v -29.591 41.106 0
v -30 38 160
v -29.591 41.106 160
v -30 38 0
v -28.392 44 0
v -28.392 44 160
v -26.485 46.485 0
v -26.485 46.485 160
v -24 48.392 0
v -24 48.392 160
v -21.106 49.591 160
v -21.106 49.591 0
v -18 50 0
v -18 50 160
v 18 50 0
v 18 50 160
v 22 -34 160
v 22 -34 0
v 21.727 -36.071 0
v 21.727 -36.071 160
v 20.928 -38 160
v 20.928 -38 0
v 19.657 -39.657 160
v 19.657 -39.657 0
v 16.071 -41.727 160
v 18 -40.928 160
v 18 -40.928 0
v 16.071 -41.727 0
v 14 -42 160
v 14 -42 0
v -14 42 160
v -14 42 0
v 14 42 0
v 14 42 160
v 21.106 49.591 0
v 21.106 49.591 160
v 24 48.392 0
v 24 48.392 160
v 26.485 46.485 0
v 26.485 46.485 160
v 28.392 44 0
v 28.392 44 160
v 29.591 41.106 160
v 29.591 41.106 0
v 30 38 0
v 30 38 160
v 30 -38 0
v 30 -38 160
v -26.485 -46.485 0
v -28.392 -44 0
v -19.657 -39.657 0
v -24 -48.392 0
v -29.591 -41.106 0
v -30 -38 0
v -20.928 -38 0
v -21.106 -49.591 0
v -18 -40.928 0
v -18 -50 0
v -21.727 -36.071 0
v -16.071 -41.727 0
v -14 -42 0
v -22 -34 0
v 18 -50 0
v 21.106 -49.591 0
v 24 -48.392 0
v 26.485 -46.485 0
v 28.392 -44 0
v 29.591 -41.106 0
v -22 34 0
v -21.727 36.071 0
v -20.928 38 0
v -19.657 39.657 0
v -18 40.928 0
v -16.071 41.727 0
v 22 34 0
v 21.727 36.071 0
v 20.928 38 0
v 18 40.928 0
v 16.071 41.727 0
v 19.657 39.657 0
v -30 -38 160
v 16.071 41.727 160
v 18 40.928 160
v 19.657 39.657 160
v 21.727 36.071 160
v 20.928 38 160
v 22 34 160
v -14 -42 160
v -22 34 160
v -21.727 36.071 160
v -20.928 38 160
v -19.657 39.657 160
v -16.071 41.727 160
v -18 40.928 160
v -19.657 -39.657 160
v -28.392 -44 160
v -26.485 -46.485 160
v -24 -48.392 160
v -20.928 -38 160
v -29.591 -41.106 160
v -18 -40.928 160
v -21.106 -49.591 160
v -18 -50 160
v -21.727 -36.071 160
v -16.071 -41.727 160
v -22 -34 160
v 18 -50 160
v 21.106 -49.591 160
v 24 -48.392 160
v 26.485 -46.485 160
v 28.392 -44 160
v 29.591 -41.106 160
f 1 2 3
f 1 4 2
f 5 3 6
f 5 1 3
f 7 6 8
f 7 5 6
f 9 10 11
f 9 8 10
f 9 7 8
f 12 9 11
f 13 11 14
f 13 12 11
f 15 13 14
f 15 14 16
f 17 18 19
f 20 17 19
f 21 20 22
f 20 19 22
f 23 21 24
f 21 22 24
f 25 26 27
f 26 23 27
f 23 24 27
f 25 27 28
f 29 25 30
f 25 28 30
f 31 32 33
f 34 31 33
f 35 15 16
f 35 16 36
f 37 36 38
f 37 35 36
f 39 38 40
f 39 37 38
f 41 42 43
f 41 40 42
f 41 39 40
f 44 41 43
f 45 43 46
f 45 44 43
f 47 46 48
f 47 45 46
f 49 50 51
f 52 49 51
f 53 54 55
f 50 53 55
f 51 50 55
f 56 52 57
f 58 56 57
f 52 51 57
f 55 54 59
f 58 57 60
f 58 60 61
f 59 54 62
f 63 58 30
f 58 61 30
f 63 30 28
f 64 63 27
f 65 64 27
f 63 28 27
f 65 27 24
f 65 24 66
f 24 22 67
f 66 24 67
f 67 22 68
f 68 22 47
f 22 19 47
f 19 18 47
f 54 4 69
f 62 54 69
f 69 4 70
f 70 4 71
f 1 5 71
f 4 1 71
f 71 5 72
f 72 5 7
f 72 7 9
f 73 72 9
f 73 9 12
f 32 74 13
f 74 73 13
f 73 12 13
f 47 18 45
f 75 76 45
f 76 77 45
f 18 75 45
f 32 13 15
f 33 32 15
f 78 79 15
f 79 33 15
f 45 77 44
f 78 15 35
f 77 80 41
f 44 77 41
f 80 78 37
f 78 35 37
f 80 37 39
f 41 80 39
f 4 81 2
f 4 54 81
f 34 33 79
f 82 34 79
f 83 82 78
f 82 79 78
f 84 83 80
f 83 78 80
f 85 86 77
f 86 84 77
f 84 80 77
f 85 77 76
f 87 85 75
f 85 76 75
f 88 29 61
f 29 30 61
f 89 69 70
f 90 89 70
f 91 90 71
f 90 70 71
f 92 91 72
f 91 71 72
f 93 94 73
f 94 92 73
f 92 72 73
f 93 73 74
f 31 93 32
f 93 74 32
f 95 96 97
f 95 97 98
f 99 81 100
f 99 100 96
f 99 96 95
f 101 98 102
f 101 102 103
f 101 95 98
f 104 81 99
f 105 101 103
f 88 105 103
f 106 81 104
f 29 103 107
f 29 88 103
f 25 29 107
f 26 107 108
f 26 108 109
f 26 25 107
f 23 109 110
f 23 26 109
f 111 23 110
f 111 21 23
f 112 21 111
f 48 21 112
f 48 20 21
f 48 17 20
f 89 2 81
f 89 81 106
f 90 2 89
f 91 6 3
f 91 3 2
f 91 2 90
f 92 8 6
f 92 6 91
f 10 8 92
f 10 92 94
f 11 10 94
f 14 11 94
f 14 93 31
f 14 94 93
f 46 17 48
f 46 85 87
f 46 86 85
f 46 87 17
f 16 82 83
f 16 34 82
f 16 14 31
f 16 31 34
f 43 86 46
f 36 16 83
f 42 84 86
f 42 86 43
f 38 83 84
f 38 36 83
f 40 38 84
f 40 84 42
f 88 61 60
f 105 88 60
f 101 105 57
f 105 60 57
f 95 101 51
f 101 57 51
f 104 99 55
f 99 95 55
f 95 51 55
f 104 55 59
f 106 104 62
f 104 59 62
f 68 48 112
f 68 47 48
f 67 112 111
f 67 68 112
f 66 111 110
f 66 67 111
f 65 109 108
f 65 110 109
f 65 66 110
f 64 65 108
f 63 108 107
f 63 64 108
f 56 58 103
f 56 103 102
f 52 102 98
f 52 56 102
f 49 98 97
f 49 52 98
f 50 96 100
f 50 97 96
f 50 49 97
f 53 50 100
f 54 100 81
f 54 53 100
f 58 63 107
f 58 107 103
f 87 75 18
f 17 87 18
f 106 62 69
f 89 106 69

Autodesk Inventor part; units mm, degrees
ref_plane "YZ Plane" through (0, 0, 0) normal (1, 0, 0) x (0, 1, 0)
ref_plane "Startebene" through (0, 0, 0) normal (0, 0, 1) x (1, 0, 0)
ref_plane "Endebene" through (0, 0, 160) normal (0, 0, 1) x (1, 0, 0)
sketch "Skizze" plane through (0, 0, 0) normal (0, 0, 1) x (1, 0, 0)
  line L0 (-30, -38) -> (-30, 38)
  line L1 (-18, 50) -> (18, 50)
  line L2 (30, 38) -> (30, -38)
  line L3 (18, -50) -> (-18, -50)
  arc A0 (-30, -38) -> (-18, -50) centre (-18, -38) ccw
  arc A1 (-18, 50) -> (-30, 38) centre (-18, 38) ccw
  arc A2 (30, 38) -> (18, 50) centre (18, 38) ccw
  arc A3 (18, -50) -> (30, -38) centre (18, -38) ccw
  line L4 (-14, 42) -> (14, 42)
  line L5 (22, 34) -> (22, -34)
  line L6 (14, -42) -> (-14, -42)
  line L7 (-22, -34) -> (-22, 34)
  line L8 (0, 73.4794) -> (0, -73.4794) construction
  line L9 (-45.4794, 0) -> (45.4794, 0) construction
  arc A4 (-22, -34) -> (-14, -42) centre (-14, -34) ccw
  arc A5 (-14, 42) -> (-22, 34) centre (-14, 34) ccw
  arc A6 (22, 34) -> (14, 42) centre (14, 34) ccw
  arc A7 (14, -42) -> (22, -34) centre (14, -34) ccw
  dimension "d7" = 12
  dimension "d10" = 100
  dimension "d11" = 60
  dimension "d12" = 8
  dimension "d15" = 50
  dimension "d16" = 30
  dimension "d19" = 8
  dimension "d20" = 8
extrude "Körper" add sketch "Skizze" along normal up to surface (160 mm away) from surface at 0
sketch "Sketch3" plane through (0, 0, 0) normal (0, 0, 1) x (1, 0, 0)
  line L0 (0, 0) -> (10, 0)
ref_plane "Work Plane3" through (0, 0, 0) normal (0, -1, 0) x (1, 0, 0)
sketch "Sketch4" plane through (0, 0, 0) normal (0, -1, 0) x (1, 0, 0)
  line L0 (-2, 0) -> (12, 0)
  line L1 (-2, 160) -> (12, 160)
  dimension "d18" = 160
equation "\"d7\" = G_IR"
equation "\"d10\" = G_H"
equation "\"d11\" = G_W"
equation "\"d12\" = G_T"
equation "\"d15\" = 0.5 * d10"
equation "\"d16\" = 0.5 * d11"
equation "\"d19\" = G_T"
equation "\"d20\" = G_T"
equation "\"d3\" = G_L"
equation "\"G_W\" = 60"
equation "\"G_H\" = 100"
equation "\"G_T\" = 8"
equation "\"G_IR\" = 12"
equation "\"G_L\" = d18"
equation "\"G_OFFSET_START\" = 0"
equation "\"G_OFFSET_END\" = 0"
properties part number "EN 10210-2 - 90 x 50 x 5 - 120" material "Stahl, weich"
